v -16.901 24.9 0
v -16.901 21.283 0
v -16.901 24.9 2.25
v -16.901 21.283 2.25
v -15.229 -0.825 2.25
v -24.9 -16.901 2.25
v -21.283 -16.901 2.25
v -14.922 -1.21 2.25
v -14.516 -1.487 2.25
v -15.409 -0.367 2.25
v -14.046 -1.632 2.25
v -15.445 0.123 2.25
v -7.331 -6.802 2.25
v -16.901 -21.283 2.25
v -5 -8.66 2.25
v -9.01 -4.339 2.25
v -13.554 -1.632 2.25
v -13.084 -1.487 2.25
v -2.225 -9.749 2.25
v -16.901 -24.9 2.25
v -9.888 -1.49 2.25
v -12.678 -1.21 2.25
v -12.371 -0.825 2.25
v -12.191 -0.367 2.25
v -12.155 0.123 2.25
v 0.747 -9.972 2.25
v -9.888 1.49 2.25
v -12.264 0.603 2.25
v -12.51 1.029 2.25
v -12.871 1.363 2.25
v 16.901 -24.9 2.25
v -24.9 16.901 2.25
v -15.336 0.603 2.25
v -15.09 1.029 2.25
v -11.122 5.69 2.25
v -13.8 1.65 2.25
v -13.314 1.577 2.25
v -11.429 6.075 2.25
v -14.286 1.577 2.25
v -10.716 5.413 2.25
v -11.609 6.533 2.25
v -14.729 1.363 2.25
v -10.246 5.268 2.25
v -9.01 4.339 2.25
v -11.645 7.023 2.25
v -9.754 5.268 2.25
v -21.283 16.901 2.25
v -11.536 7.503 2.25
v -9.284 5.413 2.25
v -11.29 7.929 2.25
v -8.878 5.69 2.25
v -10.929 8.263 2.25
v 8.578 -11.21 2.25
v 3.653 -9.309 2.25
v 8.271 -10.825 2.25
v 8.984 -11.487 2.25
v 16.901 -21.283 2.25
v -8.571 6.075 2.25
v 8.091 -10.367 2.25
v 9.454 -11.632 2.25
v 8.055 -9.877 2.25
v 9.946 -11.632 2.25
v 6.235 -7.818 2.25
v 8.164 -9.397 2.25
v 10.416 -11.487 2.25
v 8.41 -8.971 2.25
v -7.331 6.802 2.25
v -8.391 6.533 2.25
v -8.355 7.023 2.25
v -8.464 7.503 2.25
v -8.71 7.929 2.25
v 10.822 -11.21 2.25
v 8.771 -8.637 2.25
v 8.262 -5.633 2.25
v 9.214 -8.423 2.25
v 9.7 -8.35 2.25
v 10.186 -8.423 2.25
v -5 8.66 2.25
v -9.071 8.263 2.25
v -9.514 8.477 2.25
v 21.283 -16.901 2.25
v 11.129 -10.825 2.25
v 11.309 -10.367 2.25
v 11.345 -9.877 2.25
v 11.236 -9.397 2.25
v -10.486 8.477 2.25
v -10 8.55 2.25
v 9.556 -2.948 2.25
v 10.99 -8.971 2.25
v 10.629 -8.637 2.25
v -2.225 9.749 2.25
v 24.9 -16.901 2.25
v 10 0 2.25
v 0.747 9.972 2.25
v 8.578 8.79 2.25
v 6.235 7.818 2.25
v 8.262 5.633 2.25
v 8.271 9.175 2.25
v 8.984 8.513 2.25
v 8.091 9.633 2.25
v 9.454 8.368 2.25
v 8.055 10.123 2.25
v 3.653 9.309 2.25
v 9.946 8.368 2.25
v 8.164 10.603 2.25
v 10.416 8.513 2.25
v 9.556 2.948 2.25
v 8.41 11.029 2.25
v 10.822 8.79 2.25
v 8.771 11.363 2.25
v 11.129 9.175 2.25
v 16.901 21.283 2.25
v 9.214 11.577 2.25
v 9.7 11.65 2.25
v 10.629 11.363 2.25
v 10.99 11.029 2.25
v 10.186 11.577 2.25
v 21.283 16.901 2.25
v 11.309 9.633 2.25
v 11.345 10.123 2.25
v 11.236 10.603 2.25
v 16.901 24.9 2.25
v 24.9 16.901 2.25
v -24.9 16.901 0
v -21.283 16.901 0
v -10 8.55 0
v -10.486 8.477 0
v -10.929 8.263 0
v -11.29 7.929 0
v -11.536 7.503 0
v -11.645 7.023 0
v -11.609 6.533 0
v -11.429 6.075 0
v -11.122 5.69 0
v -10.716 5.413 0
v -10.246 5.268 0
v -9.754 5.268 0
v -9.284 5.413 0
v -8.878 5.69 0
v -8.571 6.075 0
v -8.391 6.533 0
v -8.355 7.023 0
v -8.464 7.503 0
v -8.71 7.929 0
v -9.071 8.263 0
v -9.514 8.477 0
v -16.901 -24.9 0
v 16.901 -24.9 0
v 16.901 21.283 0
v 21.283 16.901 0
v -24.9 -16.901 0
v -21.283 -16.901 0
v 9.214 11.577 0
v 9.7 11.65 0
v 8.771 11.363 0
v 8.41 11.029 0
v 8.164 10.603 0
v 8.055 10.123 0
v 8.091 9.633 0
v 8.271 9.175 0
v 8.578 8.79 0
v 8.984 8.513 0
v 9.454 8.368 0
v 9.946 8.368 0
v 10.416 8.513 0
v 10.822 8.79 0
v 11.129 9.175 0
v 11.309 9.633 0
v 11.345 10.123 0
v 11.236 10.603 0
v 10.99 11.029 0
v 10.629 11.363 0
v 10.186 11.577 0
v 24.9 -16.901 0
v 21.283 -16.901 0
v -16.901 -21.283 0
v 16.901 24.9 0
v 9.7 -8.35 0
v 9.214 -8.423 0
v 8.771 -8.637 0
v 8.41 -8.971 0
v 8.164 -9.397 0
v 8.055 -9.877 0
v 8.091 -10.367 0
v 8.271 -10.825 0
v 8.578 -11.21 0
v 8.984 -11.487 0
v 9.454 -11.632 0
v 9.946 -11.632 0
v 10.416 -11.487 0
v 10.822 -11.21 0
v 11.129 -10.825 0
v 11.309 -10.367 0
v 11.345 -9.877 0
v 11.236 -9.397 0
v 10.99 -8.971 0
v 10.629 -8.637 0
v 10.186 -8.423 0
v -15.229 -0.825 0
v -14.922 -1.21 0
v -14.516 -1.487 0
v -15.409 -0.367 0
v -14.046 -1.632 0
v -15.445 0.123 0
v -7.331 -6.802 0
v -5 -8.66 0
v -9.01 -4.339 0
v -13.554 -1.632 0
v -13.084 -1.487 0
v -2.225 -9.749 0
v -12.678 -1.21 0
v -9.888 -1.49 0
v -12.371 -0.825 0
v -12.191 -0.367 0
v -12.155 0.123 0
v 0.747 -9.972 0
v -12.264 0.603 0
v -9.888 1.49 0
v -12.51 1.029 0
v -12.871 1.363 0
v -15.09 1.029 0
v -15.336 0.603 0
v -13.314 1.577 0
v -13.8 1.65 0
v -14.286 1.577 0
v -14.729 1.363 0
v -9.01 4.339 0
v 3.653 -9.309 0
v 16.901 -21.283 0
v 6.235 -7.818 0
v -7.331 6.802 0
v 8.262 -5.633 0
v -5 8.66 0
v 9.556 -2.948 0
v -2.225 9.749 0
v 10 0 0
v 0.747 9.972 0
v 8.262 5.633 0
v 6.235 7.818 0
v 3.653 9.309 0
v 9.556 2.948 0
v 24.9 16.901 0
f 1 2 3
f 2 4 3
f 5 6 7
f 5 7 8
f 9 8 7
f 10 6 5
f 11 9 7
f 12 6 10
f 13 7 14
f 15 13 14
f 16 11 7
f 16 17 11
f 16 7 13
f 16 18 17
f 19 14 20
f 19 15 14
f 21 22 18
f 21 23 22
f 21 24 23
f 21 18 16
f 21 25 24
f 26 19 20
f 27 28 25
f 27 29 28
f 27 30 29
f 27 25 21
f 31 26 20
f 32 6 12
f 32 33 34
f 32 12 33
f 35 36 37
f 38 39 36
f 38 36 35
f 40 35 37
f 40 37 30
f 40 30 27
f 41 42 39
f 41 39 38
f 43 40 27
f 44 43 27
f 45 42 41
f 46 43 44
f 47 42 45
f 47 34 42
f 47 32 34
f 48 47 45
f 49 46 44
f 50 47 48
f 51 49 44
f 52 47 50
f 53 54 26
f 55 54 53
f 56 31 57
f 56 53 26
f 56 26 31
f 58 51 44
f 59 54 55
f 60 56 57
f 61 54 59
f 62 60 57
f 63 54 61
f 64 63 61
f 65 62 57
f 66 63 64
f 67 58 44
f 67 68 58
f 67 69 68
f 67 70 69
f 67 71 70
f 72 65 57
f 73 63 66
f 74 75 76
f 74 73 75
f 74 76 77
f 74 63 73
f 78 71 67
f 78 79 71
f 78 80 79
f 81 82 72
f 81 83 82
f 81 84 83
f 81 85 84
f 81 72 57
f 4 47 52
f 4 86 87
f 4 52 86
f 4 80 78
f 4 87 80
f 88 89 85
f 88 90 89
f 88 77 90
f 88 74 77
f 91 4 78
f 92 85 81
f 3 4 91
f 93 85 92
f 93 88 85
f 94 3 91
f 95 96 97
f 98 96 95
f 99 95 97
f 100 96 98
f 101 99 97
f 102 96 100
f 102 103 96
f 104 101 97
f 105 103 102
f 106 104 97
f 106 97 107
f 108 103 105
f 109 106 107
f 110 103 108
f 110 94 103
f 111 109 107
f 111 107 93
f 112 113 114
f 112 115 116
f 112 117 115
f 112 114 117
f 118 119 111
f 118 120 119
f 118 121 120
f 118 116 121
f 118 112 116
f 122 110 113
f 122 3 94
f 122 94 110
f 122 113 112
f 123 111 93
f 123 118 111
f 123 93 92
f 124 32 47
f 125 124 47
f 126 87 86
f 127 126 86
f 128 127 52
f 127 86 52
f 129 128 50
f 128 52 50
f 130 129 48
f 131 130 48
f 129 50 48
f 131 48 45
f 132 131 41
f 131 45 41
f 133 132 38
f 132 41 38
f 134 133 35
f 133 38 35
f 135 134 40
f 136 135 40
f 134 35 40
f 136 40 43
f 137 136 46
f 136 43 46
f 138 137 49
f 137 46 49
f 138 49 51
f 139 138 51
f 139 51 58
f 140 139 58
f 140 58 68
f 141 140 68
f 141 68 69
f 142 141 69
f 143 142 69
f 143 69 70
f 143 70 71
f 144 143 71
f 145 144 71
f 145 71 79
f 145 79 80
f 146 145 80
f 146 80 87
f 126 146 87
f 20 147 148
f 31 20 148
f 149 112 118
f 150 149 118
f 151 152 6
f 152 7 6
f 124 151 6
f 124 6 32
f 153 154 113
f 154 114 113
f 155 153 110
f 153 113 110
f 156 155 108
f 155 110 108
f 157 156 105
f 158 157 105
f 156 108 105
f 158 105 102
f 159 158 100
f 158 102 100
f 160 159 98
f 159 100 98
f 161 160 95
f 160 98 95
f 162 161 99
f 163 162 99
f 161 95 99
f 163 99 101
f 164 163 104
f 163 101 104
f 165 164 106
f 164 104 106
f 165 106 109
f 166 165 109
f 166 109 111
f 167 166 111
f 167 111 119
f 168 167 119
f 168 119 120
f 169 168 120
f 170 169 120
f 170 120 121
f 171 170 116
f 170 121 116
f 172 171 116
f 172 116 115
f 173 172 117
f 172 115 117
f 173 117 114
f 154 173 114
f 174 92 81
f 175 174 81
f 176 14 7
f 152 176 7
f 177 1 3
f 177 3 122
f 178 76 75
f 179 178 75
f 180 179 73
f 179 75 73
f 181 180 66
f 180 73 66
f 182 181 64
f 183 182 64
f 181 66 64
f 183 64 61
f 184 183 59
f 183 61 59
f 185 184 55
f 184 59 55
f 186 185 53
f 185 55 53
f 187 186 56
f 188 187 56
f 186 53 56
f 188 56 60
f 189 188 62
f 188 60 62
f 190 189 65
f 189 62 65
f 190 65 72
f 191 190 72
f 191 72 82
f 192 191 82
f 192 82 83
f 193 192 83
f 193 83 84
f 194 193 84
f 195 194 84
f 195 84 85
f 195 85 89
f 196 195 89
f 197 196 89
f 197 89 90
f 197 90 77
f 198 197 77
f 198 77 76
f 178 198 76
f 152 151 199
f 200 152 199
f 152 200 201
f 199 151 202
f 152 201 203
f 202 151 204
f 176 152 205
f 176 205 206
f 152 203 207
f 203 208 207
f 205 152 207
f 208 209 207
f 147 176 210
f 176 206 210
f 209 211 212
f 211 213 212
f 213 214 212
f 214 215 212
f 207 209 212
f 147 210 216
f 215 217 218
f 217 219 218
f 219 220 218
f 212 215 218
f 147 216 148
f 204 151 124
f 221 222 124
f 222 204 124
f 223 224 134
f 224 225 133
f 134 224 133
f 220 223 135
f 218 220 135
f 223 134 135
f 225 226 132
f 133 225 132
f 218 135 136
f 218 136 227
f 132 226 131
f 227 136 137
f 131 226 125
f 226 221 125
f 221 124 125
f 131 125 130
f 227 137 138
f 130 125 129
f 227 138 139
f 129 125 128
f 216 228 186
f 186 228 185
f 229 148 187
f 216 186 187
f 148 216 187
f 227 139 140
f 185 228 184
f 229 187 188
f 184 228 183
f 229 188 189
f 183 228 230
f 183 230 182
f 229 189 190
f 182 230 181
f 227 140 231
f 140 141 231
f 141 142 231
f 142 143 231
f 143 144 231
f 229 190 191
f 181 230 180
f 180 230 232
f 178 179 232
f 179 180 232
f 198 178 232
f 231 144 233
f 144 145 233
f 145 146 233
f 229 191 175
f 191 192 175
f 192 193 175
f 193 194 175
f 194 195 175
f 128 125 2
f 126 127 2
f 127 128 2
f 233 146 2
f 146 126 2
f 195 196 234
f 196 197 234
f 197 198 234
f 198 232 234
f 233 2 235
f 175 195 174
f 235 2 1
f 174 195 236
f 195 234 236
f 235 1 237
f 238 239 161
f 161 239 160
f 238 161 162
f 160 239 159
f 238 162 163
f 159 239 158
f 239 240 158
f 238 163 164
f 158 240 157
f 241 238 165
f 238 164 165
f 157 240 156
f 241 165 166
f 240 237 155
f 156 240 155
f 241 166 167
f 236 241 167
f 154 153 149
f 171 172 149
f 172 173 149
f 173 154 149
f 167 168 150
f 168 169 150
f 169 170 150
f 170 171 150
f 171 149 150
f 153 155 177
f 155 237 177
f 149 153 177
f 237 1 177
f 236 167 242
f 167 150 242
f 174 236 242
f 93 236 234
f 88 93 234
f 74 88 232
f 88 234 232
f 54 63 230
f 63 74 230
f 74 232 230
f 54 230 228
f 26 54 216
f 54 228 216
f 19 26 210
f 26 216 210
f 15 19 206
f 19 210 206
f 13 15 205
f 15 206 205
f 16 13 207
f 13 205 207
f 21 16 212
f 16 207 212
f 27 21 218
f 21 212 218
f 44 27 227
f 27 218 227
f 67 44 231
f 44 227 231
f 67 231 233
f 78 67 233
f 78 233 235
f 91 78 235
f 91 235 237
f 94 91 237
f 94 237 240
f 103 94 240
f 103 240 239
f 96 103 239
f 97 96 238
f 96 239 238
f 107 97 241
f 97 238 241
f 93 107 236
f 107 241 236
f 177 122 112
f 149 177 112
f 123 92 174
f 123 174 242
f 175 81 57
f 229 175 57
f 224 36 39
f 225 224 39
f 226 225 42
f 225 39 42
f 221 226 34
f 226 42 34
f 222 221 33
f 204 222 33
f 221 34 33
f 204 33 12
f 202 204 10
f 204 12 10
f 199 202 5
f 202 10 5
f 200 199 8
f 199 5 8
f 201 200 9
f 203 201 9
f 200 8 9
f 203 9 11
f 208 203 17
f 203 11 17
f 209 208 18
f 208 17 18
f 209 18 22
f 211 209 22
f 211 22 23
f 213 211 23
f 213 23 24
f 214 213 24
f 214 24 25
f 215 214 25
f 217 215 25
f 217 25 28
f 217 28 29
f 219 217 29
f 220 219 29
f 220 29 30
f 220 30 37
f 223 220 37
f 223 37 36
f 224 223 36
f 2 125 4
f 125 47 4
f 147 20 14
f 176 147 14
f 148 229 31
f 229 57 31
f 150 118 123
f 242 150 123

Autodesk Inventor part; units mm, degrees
ref_plane "YZ Plane" through (0, 0, 0) normal (1, 0, 0) x (0, 1, 0)
ref_plane "Work Plane1" through (-29.1, -14.5, 2.4) normal (0, 0, -1) x (0, 1, 0)
ref_plane "Work Plane2" through (-13.8999, -10.5497, 2.25) normal (0, 0, -1) x (0, 1, 0)
sketch "Sketch1" plane through (0, 0, 0) normal (0, 0, 1) x (1, 0, 0)
  line L0 (-34.86, 0) -> (34.86, 0) construction
  line L1 (0, -34.86) -> (0, 34.86) construction
  line L2 (0, 0) -> (11.1575, 11.1575) construction
  line L3 (0, 0) -> (15.7791, 0) construction
  line L4 (0, 24.9) -> (16.8009, 24.9)
  line L5 (16.8009, 24.9) -> (16.8009, 21.2415)
  line L6 (16.8009, 21.2415) -> (19.0212, 19.0212)
  line L7 (24.9, 0) -> (24.9, 16.8009)
  line L8 (24.9, 16.8009) -> (21.2415, 16.8009)
  line L9 (21.2415, 16.8009) -> (19.0212, 19.0212)
  line L10 (0, -24.9) -> (16.8009, -24.9)
  line L11 (16.8009, -24.9) -> (16.8009, -21.2415)
  line L12 (16.8009, -21.2415) -> (19.0212, -19.0212)
  line L13 (24.9, 0) -> (24.9, -16.8009)
  line L14 (24.9, -16.8009) -> (21.2415, -16.8009)
  line L15 (21.2415, -16.8009) -> (19.0212, -19.0212)
  line L16 (0, 24.9) -> (-16.8009, 24.9)
  line L17 (-16.8009, 24.9) -> (-16.8009, 21.2415)
  line L18 (-16.8009, 21.2415) -> (-19.0212, 19.0212)
  line L19 (-24.9, 16.8009) -> (-21.2415, 16.8009)
  line L20 (-21.2415, 16.8009) -> (-19.0212, 19.0212)
  line L21 (0, -24.9) -> (-16.8009, -24.9)
  line L22 (-16.8009, -24.9) -> (-16.8009, -21.2415)
  line L23 (-16.8009, -21.2415) -> (-19.0212, -19.0212)
  line L24 (-21.2415, -16.8009) -> (-19.0212, -19.0212)
  line L25 (-24.9, -16.8009) -> (-21.2415, -16.8009)
  line L26 (-24.9, 0) -> (-24.9, -16.8009)
  line L27 (-24.9, 0) -> (-24.9, 16.8009)
  circle A0 centre (0, 0) radius 10
  dimension "d0" = 45
  dimension "d2" = 24.9
  dimension "d3" = 3.14
  dimension "d4" = 26.9
  dimension "d5" = 20
extrude "Extrusion1" add sketch "Sketch1" along normal up to surface (2.25 mm away)
sketch "Sketch5" plane through (0, 0, 0) normal (0, 0, -1) x (-1, 0, 0)
  circle A0 centre (-9.7, 10) radius 1.4
  circle A1 centre (-9.7, -10) radius 1.4
  circle A2 centre (13.8, 0) radius 1.4
  circle A3 centre (-10, 6.9) radius 0.75
  circle A4 centre (10, 6.9) radius 1.25
  point P0 (0, 0)
hole "Hole1" at (-13.8, 0, 0) at (9.7, -10, 0) at (-10, 6.9, 0) at (9.7, 10, 0) direction (0, 0, 1) diameter 3.3 depth 12 tip angle 118
sketch "Skizze6" plane through (-16.8009, 24.9, 2.25) normal (0, 0, 1) x (1, 0, 0)
  circle A0 centre (6.8009, -18) radius 1.65 construction
  circle A1 centre (3.0009, -24.9) radius 1.65 construction
  circle A2 centre (26.5009, -34.9) radius 1.65 construction
  circle A3 centre (26.5009, -14.9) radius 1.65 construction
  circle A4 centre (16.8009, -24.9) radius 10 construction
  line L0 (33.6017, -3.6585) -> (33.6017, 0) projected
  line L1 (33.6017, 0) -> (0, 0) construction
  line L2 (0, 0) -> (0, -3.6585) projected
  line L3 (0, -3.6585) -> (-4.4406, -8.0991) projected
  line L4 (-4.4406, -8.0991) -> (-8.0991, -8.0991) projected
  line L5 (-8.0991, -8.0991) -> (-8.0991, -41.7009) construction
  line L6 (-8.0991, -41.7009) -> (-4.4406, -41.7009) projected
  line L7 (-4.4406, -41.7009) -> (0, -46.1415) projected
  line L8 (0, -46.1415) -> (0, -49.8) projected
  line L9 (0, -49.8) -> (33.6017, -49.8) construction
  line L10 (33.6017, -49.8) -> (33.6017, -46.1415) projected
  line L11 (33.6017, -46.1415) -> (38.0423, -41.7009) projected
  line L12 (38.0423, -41.7009) -> (41.7009, -41.7009) projected
  line L13 (41.7009, -41.7009) -> (41.7009, -8.0991) construction
  line L14 (41.7009, -8.0991) -> (38.0423, -8.0991) projected
  line L15 (38.0423, -8.0991) -> (33.6017, -3.6585) projected
  line L16 (-0.1, 0.1) -> (33.7017, 0.1) construction
  line L17 (33.7017, 0.1) -> (33.7017, -3.6171)
  line L18 (33.7017, -3.6171) -> (38.0838, -7.9991)
  line L19 (38.0838, -7.9991) -> (41.8009, -7.9991)
  line L20 (41.8009, -7.9991) -> (41.8009, -41.8009) construction
  line L21 (41.8009, -41.8009) -> (38.0838, -41.8009)
  line L22 (38.0838, -41.8009) -> (33.7017, -46.1829)
  line L23 (33.7017, -46.1829) -> (33.7017, -49.9)
  line L24 (33.7017, -49.9) -> (-0.1, -49.9) construction
  line L25 (-0.1, -49.9) -> (-0.1, -46.1829)
  line L26 (-0.1, -46.1829) -> (-4.4821, -41.8009)
  line L27 (-4.4821, -41.8009) -> (-8.1991, -41.8009)
  line L28 (-8.1991, -41.8009) -> (-8.1991, -7.9991) construction
  line L29 (-8.1991, -7.9991) -> (-4.4821, -7.9991)
  line L30 (-4.4821, -7.9991) -> (-0.1, -3.6171)
  line L31 (-0.1, -3.6171) -> (-0.1, 0.1)
  line L32 (-8.0991, -8.0991) -> (-8.0991, -7.9991)
  line L33 (0, 0) -> (-0.1, 0)
  line L34 (33.6017, 0) -> (33.7017, 0)
  line L35 (41.7009, -8.0991) -> (38.0423, -8.0991) projected
  line L36 (41.7009, -8.0991) -> (41.7009, -7.9991)
  line L37 (41.7009, -41.7009) -> (41.7009, -41.8009)
  line L38 (33.6017, -49.8) -> (33.7017, -49.8)
  line L39 (-8.0991, -41.7009) -> (-8.0991, -41.8009)
  line L40 (0, -49.8) -> (-0.1, -49.8)
  point P0 (16.8009, -24.9)
  dimension "d25" = 0.1
extrude "IM_offset" add sketch "Skizze6" against normal up to surface (2.25 mm away)
properties part number "20_Cube_insert_AlliedVision_Alvium_v3"
